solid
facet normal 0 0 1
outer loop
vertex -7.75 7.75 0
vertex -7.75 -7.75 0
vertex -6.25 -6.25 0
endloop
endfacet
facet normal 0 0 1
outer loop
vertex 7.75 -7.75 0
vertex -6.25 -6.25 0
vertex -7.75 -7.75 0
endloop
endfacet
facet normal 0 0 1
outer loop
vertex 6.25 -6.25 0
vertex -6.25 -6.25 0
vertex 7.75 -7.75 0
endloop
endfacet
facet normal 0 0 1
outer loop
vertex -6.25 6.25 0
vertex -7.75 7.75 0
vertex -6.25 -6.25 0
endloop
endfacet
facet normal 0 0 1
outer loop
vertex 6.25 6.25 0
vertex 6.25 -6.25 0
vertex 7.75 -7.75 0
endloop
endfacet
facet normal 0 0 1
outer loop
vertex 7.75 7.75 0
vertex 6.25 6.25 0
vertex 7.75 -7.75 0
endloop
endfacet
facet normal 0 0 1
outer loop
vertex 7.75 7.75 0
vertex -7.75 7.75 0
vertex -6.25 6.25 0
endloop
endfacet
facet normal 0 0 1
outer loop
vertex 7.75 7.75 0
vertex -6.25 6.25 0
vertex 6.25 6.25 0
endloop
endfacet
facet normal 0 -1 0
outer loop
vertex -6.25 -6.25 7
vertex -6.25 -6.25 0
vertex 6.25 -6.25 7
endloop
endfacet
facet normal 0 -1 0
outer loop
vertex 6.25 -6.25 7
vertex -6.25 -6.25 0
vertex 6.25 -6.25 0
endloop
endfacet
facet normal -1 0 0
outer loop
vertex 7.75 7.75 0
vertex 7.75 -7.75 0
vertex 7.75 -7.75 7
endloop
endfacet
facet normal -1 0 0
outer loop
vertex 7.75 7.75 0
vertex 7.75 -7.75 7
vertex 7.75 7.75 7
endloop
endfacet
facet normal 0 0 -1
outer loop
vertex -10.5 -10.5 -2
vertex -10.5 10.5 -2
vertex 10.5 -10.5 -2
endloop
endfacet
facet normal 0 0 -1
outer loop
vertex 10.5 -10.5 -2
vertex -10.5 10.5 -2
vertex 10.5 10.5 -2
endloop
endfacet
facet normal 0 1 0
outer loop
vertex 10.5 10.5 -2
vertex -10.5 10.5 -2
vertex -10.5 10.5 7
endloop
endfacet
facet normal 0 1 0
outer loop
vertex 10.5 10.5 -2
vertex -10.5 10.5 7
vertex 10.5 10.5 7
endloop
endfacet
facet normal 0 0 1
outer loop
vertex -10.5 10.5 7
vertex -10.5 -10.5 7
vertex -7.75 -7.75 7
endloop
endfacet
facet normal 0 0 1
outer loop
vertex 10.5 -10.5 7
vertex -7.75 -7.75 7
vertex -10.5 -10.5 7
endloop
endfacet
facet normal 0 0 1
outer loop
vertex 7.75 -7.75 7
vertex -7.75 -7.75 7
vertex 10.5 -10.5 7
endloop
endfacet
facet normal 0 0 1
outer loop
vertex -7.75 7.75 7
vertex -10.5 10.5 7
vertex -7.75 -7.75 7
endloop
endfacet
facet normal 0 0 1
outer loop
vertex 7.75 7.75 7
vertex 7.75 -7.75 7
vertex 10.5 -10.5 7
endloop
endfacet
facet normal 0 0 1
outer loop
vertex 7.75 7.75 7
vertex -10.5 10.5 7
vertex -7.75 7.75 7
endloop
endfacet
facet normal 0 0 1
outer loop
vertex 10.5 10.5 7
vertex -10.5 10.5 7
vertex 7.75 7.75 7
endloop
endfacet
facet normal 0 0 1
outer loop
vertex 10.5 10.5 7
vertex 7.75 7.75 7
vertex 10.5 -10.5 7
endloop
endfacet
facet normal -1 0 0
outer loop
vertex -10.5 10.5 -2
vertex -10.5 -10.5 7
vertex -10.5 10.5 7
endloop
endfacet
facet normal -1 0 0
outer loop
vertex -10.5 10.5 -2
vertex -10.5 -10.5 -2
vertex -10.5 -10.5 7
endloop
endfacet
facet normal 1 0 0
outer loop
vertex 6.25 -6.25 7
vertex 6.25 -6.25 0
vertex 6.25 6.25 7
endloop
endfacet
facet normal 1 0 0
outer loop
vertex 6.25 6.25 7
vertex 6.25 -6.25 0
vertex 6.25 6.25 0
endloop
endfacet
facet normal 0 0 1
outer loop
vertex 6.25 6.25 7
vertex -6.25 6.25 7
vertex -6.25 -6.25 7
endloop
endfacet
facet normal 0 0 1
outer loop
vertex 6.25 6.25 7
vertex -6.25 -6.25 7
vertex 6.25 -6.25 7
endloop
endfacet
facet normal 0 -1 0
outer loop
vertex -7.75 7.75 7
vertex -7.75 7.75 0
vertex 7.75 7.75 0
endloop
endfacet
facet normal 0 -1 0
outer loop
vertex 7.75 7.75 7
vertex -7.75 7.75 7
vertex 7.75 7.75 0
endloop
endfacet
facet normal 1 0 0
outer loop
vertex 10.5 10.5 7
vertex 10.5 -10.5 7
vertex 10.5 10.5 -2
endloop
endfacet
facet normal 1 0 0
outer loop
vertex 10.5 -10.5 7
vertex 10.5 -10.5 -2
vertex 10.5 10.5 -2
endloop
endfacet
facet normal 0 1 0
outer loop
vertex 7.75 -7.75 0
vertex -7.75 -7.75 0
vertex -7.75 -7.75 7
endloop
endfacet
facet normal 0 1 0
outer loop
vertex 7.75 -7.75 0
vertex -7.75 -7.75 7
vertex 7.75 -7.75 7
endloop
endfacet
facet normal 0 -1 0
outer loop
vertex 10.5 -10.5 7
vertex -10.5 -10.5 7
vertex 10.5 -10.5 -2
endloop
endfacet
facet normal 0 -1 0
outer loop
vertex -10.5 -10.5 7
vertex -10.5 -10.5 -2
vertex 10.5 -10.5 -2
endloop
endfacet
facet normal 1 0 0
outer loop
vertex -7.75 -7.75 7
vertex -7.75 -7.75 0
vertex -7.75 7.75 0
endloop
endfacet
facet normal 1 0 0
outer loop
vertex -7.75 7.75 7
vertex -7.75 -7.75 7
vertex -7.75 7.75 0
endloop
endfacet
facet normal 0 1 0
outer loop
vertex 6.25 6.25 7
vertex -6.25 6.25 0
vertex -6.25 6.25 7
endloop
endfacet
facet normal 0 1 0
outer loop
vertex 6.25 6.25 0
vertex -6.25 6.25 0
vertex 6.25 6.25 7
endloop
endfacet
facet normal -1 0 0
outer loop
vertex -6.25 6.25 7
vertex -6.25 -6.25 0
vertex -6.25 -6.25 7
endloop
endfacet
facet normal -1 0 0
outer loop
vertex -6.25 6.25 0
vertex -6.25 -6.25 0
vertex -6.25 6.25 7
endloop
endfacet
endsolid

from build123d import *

# Parameters (mm, degrees)
F0_W     = 21
F0_H     = 21
F0_W_2   = 15.5
F0_H_2   = 15.5
F0_W_3   = 12.5
F0_H_3   = 12.5
F1_DEPTH = 2
F2_DEPTH = 7


with BuildPart() as f1:
    # F0 (on Top) → F1 (new body)
    with BuildSketch(Plane.XY):
        Rectangle(F0_W, F0_H)
        Rectangle(F0_W_2, F0_H_2, mode=Mode.SUBTRACT)
        Rectangle(F0_W_2, F0_H_2)
        Rectangle(F0_W_3, F0_H_3, mode=Mode.SUBTRACT)
        Rectangle(F0_W_3, F0_H_3)
    extrude(amount=-F1_DEPTH)

    # F0 (on Top) → F2 (join)
    with BuildSketch(Plane.XY):
        Rectangle(F0_W, F0_H)
        Rectangle(F0_W_2, F0_H_2, mode=Mode.SUBTRACT)
        Rectangle(F0_W_3, F0_H_3)
    extrude(amount=F2_DEPTH)


solid = f1.part
